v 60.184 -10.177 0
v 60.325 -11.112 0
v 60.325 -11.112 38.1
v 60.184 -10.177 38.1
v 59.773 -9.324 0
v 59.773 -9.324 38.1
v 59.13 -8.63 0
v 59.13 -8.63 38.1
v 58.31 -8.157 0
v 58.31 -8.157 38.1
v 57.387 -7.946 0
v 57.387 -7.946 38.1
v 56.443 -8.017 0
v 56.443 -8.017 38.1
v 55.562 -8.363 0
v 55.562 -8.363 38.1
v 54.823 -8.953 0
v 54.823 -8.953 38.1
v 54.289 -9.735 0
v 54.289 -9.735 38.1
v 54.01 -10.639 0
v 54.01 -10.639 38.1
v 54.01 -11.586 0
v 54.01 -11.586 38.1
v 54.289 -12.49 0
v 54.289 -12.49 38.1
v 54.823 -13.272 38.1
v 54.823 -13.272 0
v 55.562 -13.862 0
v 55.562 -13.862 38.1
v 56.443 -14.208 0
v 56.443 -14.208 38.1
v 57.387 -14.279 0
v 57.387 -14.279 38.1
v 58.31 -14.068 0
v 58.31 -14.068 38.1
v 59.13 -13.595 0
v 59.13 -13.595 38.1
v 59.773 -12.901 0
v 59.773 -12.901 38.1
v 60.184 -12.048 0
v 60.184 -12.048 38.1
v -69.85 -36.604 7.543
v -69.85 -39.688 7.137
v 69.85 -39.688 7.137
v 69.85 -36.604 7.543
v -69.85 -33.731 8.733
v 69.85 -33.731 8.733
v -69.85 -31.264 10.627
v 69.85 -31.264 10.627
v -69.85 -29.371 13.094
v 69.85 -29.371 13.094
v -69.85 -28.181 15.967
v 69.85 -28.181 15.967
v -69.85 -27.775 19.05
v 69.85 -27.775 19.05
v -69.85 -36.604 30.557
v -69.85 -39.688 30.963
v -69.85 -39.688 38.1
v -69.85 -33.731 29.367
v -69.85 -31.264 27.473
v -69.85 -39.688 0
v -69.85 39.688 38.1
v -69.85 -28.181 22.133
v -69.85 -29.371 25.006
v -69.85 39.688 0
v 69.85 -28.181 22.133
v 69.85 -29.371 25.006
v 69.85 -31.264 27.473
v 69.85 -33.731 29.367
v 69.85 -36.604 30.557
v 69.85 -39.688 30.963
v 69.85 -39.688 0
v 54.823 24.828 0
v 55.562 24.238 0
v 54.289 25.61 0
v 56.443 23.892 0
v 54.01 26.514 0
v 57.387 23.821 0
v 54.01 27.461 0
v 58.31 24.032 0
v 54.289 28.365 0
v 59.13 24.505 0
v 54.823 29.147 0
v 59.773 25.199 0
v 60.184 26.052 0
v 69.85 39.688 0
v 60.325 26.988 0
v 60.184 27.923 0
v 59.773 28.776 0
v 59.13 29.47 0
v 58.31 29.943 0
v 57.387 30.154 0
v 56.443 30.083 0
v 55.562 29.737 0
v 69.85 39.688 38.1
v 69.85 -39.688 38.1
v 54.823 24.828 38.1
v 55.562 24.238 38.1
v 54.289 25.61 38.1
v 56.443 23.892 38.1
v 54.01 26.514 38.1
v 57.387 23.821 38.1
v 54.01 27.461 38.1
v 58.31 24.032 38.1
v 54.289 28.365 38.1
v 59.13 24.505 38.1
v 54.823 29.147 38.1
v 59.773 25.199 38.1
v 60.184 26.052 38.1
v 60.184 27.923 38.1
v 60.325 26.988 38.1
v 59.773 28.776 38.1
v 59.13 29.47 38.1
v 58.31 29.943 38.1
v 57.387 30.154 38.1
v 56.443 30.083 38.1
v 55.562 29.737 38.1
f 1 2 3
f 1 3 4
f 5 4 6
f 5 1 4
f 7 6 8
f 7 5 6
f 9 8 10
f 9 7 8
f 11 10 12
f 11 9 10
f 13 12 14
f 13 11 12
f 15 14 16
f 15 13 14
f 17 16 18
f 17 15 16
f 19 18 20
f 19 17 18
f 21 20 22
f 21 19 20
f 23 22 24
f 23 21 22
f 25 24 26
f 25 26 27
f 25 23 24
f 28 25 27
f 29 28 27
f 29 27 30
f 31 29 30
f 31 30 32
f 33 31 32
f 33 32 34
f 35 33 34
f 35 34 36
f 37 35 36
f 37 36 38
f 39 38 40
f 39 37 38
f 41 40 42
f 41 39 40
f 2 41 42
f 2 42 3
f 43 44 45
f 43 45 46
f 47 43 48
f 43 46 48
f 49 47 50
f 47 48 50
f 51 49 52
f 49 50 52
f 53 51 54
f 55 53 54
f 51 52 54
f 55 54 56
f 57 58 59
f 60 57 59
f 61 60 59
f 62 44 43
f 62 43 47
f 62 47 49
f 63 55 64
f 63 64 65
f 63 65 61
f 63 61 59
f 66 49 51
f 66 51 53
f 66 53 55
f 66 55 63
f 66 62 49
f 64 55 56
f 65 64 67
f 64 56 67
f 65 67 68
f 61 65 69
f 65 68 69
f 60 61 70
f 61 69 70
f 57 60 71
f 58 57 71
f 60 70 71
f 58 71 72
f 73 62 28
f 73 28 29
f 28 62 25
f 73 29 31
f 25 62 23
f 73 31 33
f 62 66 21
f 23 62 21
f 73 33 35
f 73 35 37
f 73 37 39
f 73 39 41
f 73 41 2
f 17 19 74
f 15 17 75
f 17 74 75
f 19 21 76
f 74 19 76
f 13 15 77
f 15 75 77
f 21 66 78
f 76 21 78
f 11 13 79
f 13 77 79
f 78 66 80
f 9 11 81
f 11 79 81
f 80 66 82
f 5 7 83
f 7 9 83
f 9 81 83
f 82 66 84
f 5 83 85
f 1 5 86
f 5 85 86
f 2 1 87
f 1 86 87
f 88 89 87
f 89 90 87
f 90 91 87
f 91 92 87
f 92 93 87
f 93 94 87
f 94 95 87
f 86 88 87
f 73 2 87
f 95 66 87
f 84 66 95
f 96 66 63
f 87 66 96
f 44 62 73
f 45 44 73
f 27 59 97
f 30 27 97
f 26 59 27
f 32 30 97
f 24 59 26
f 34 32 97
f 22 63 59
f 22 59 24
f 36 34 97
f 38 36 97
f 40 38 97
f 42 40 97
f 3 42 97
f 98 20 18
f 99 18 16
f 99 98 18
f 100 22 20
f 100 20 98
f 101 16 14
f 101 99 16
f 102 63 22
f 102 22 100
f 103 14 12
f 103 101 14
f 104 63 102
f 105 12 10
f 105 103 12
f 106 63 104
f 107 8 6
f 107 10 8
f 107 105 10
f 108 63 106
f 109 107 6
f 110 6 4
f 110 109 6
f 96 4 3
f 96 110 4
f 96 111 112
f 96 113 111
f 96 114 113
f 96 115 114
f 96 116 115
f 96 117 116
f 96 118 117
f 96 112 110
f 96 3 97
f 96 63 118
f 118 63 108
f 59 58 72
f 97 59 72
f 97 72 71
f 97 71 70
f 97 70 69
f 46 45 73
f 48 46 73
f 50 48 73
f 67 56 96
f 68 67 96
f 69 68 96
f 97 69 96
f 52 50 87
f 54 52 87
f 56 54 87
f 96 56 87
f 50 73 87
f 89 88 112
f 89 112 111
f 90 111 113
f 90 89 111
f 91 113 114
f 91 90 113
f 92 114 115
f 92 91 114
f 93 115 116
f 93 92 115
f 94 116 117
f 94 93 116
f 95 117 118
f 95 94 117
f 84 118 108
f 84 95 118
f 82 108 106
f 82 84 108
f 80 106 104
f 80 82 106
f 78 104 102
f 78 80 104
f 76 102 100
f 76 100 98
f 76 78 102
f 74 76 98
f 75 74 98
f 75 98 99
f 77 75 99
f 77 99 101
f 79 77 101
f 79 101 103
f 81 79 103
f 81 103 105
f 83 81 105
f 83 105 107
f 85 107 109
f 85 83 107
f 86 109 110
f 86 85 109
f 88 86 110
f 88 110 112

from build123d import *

# Parameters (mm, degrees)
F0_W     = 139.7
F0_H     = 79.375
F0_R     = 3.175
F1_DEPTH = 38.1
F3_DEPTH = 139.701


with BuildPart() as f1:
    # F0 (on Top) → F1 (new body)
    with BuildSketch(Plane.XY):
        Rectangle(F0_W, F0_H)
        with Locations((57.15, -11.1125)):
            Circle(F0_R, mode=Mode.SUBTRACT)
        with Locations((57.15, 26.9875)):
            Circle(F0_R, mode=Mode.SUBTRACT)
    extrude(amount=F1_DEPTH)

    # F2 (on face) → F3 (cut, through all)
    with BuildSketch(Plane.YZ.offset(69.85)):
        with BuildLine():
            ThreePointArc((-39.6875, 7.1374), (-31.26402, 10.62652), (-27.7749, 19.05))
            ThreePointArc((-27.7749, 19.05), (-31.26402, 27.47348), (-39.6875, 30.9626))
            Line((-39.6875, 30.9626), (-39.6875, 7.1374))
        make_face()
    extrude(amount=-F3_DEPTH, mode=Mode.SUBTRACT)


solid = f1.part
